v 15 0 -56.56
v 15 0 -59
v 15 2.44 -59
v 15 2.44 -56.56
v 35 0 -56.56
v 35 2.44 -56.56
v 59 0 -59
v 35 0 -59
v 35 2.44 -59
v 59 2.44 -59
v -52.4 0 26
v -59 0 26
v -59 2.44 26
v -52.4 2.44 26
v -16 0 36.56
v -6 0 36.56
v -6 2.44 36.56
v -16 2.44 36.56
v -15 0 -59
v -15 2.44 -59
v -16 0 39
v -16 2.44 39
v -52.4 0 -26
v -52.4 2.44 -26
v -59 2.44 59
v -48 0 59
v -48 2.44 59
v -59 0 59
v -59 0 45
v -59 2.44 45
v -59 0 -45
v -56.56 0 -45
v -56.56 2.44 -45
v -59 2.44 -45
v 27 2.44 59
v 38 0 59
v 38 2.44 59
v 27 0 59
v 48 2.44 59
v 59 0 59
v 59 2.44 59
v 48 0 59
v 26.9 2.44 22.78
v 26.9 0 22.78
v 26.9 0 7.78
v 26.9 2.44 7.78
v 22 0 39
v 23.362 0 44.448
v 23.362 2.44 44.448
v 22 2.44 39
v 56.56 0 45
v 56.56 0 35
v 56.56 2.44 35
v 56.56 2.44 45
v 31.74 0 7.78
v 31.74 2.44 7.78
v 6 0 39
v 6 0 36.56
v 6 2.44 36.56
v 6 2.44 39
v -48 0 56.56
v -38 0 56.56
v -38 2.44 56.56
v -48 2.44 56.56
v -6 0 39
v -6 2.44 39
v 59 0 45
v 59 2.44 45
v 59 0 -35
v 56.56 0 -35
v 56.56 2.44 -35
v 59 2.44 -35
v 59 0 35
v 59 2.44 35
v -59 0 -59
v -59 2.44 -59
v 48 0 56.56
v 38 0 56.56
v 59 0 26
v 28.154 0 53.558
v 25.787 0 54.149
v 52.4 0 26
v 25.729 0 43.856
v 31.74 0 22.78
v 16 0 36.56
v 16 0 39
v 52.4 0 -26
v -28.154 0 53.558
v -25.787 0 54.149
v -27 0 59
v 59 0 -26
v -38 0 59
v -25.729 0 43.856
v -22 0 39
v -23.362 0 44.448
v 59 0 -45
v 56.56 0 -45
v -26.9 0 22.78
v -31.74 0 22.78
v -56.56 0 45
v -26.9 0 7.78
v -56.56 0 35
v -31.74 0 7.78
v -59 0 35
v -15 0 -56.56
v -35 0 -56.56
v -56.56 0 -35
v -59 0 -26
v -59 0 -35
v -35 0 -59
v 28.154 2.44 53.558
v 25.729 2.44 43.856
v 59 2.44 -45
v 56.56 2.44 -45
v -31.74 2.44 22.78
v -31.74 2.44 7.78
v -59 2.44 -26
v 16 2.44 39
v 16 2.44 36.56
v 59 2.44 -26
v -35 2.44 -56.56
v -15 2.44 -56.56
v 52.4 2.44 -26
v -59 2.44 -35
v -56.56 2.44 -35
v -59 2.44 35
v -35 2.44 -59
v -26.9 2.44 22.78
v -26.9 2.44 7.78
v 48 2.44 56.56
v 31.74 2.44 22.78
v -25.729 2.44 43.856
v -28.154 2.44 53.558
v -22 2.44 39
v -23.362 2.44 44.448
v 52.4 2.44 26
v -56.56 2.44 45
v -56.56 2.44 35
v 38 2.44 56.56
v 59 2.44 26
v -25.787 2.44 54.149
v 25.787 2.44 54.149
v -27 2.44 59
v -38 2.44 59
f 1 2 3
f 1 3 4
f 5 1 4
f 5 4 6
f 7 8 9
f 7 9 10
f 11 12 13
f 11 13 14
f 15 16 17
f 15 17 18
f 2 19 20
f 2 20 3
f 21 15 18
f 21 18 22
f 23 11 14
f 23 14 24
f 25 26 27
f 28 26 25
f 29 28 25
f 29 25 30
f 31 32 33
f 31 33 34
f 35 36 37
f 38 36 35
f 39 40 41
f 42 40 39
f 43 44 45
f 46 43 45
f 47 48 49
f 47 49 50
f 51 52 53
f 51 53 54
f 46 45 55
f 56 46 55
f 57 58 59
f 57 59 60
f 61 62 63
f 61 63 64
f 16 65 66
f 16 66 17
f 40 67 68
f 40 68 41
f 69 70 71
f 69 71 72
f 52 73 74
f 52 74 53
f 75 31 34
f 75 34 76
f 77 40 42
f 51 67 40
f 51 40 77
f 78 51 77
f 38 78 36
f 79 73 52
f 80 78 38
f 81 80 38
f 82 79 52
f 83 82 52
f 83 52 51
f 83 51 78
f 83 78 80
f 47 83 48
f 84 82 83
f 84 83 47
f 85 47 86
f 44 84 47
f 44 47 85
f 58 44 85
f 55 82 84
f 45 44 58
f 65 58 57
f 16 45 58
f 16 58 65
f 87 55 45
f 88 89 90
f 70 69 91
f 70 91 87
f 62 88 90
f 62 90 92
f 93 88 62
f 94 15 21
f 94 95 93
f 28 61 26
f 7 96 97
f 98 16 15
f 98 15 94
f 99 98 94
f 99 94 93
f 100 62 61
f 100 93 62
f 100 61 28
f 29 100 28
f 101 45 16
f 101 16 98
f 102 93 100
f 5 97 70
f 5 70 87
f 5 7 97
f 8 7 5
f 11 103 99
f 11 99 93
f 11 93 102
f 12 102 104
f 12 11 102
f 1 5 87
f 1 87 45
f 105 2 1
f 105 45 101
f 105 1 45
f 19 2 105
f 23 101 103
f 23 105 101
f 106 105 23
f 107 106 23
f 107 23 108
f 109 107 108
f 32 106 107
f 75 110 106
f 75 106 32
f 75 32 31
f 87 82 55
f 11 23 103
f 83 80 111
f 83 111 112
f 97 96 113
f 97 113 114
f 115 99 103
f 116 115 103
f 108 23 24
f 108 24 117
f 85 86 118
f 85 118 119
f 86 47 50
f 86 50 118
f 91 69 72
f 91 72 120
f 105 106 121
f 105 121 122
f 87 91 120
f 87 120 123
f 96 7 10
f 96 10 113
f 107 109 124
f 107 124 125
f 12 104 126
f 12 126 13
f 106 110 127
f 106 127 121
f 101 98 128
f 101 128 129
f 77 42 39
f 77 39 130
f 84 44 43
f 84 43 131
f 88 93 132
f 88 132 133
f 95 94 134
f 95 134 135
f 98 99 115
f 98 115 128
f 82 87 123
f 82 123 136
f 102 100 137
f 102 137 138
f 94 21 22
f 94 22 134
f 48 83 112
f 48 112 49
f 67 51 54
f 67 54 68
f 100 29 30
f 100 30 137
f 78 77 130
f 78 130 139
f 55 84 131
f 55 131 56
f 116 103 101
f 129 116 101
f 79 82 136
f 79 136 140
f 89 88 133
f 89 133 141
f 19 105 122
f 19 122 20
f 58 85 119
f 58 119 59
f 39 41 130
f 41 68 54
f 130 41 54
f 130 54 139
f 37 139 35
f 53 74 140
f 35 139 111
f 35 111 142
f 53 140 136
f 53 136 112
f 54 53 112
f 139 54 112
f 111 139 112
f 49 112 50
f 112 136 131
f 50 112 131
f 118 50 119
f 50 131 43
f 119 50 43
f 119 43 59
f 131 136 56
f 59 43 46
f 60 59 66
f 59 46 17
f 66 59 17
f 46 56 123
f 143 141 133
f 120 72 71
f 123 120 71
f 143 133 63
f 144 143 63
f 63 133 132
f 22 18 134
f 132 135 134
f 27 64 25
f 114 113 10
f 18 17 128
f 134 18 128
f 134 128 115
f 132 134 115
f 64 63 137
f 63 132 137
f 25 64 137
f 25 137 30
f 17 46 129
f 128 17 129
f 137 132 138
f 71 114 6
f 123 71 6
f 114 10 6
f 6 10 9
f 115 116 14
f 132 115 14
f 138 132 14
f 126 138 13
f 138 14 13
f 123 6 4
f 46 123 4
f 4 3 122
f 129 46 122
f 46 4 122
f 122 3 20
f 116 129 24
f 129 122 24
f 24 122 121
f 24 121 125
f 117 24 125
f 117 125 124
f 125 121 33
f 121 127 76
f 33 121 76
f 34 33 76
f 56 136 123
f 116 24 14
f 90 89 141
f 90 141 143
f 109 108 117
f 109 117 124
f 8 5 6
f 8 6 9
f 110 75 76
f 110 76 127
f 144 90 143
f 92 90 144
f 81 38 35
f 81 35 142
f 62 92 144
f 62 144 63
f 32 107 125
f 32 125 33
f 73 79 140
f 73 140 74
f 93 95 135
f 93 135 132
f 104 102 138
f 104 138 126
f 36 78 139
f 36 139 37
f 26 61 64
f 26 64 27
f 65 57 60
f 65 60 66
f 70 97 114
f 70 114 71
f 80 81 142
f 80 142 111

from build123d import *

# Parameters (mm, degrees)
CROQUIS1_W              = 4.84
CROQUIS1_H              = 15
SALIENTE_EXTRUIR1_DEPTH = 2.44


with BuildPart() as part:
    # Croquis1 → Saliente-Extruir1 (new body)
    with BuildSketch(Plane(origin=(0, 0, 0), x_dir=(1, 0, 0), z_dir=(0, 1, 0))):
        Polygon((-59, 45), (-59, 59), (-35, 59), (-35, 56.56), (-15, 56.56), (-15, 59), (15, 59), (15, 56.56), (35, 56.56), (35, 59), (59, 59), (59, 45), (56.56, 45), (56.56, 35), (59, 35), (59, 26), (52.4, 26), (52.4, -26), (59, -26), (59, -35), (56.56, -35), (56.56, -45), (59, -45), (59, -59), (48, -59), (48, -56.56), (38, -56.56), (38, -59), (27, -59), (25.787321875, -54.149287499), (28.154469575, -53.557500574), (25.729113325, -43.856075573), (23.361965624, -44.447862498), (22, -39), (16, -39), (16, -36.56), (6, -36.56), (6, -39), (-6, -39), (-6, -36.56), (-16, -36.56), (-16, -39), (-22, -39), (-23.361965624, -44.447862498), (-25.729113325, -43.856075573), (-28.154469575, -53.557500574), (-25.787321875, -54.149287499), (-27, -59), (-38, -59), (-38, -56.56), (-48, -56.56), (-48, -59), (-59, -59), (-59, -45), (-56.56, -45), (-56.56, -35), (-59, -35), (-59, -26), (-52.4, -26), (-52.4, 26), (-59, 26), (-59, 35), (-56.56, 35), (-56.56, 45), align=None)
        with Locations((29.32, -15.28)):
            Rectangle(CROQUIS1_W, CROQUIS1_H, mode=Mode.SUBTRACT)
        with Locations((-29.32, -15.28)):
            Rectangle(CROQUIS1_W, CROQUIS1_H, mode=Mode.SUBTRACT)
    extrude(amount=SALIENTE_EXTRUIR1_DEPTH)


solid = part.part
